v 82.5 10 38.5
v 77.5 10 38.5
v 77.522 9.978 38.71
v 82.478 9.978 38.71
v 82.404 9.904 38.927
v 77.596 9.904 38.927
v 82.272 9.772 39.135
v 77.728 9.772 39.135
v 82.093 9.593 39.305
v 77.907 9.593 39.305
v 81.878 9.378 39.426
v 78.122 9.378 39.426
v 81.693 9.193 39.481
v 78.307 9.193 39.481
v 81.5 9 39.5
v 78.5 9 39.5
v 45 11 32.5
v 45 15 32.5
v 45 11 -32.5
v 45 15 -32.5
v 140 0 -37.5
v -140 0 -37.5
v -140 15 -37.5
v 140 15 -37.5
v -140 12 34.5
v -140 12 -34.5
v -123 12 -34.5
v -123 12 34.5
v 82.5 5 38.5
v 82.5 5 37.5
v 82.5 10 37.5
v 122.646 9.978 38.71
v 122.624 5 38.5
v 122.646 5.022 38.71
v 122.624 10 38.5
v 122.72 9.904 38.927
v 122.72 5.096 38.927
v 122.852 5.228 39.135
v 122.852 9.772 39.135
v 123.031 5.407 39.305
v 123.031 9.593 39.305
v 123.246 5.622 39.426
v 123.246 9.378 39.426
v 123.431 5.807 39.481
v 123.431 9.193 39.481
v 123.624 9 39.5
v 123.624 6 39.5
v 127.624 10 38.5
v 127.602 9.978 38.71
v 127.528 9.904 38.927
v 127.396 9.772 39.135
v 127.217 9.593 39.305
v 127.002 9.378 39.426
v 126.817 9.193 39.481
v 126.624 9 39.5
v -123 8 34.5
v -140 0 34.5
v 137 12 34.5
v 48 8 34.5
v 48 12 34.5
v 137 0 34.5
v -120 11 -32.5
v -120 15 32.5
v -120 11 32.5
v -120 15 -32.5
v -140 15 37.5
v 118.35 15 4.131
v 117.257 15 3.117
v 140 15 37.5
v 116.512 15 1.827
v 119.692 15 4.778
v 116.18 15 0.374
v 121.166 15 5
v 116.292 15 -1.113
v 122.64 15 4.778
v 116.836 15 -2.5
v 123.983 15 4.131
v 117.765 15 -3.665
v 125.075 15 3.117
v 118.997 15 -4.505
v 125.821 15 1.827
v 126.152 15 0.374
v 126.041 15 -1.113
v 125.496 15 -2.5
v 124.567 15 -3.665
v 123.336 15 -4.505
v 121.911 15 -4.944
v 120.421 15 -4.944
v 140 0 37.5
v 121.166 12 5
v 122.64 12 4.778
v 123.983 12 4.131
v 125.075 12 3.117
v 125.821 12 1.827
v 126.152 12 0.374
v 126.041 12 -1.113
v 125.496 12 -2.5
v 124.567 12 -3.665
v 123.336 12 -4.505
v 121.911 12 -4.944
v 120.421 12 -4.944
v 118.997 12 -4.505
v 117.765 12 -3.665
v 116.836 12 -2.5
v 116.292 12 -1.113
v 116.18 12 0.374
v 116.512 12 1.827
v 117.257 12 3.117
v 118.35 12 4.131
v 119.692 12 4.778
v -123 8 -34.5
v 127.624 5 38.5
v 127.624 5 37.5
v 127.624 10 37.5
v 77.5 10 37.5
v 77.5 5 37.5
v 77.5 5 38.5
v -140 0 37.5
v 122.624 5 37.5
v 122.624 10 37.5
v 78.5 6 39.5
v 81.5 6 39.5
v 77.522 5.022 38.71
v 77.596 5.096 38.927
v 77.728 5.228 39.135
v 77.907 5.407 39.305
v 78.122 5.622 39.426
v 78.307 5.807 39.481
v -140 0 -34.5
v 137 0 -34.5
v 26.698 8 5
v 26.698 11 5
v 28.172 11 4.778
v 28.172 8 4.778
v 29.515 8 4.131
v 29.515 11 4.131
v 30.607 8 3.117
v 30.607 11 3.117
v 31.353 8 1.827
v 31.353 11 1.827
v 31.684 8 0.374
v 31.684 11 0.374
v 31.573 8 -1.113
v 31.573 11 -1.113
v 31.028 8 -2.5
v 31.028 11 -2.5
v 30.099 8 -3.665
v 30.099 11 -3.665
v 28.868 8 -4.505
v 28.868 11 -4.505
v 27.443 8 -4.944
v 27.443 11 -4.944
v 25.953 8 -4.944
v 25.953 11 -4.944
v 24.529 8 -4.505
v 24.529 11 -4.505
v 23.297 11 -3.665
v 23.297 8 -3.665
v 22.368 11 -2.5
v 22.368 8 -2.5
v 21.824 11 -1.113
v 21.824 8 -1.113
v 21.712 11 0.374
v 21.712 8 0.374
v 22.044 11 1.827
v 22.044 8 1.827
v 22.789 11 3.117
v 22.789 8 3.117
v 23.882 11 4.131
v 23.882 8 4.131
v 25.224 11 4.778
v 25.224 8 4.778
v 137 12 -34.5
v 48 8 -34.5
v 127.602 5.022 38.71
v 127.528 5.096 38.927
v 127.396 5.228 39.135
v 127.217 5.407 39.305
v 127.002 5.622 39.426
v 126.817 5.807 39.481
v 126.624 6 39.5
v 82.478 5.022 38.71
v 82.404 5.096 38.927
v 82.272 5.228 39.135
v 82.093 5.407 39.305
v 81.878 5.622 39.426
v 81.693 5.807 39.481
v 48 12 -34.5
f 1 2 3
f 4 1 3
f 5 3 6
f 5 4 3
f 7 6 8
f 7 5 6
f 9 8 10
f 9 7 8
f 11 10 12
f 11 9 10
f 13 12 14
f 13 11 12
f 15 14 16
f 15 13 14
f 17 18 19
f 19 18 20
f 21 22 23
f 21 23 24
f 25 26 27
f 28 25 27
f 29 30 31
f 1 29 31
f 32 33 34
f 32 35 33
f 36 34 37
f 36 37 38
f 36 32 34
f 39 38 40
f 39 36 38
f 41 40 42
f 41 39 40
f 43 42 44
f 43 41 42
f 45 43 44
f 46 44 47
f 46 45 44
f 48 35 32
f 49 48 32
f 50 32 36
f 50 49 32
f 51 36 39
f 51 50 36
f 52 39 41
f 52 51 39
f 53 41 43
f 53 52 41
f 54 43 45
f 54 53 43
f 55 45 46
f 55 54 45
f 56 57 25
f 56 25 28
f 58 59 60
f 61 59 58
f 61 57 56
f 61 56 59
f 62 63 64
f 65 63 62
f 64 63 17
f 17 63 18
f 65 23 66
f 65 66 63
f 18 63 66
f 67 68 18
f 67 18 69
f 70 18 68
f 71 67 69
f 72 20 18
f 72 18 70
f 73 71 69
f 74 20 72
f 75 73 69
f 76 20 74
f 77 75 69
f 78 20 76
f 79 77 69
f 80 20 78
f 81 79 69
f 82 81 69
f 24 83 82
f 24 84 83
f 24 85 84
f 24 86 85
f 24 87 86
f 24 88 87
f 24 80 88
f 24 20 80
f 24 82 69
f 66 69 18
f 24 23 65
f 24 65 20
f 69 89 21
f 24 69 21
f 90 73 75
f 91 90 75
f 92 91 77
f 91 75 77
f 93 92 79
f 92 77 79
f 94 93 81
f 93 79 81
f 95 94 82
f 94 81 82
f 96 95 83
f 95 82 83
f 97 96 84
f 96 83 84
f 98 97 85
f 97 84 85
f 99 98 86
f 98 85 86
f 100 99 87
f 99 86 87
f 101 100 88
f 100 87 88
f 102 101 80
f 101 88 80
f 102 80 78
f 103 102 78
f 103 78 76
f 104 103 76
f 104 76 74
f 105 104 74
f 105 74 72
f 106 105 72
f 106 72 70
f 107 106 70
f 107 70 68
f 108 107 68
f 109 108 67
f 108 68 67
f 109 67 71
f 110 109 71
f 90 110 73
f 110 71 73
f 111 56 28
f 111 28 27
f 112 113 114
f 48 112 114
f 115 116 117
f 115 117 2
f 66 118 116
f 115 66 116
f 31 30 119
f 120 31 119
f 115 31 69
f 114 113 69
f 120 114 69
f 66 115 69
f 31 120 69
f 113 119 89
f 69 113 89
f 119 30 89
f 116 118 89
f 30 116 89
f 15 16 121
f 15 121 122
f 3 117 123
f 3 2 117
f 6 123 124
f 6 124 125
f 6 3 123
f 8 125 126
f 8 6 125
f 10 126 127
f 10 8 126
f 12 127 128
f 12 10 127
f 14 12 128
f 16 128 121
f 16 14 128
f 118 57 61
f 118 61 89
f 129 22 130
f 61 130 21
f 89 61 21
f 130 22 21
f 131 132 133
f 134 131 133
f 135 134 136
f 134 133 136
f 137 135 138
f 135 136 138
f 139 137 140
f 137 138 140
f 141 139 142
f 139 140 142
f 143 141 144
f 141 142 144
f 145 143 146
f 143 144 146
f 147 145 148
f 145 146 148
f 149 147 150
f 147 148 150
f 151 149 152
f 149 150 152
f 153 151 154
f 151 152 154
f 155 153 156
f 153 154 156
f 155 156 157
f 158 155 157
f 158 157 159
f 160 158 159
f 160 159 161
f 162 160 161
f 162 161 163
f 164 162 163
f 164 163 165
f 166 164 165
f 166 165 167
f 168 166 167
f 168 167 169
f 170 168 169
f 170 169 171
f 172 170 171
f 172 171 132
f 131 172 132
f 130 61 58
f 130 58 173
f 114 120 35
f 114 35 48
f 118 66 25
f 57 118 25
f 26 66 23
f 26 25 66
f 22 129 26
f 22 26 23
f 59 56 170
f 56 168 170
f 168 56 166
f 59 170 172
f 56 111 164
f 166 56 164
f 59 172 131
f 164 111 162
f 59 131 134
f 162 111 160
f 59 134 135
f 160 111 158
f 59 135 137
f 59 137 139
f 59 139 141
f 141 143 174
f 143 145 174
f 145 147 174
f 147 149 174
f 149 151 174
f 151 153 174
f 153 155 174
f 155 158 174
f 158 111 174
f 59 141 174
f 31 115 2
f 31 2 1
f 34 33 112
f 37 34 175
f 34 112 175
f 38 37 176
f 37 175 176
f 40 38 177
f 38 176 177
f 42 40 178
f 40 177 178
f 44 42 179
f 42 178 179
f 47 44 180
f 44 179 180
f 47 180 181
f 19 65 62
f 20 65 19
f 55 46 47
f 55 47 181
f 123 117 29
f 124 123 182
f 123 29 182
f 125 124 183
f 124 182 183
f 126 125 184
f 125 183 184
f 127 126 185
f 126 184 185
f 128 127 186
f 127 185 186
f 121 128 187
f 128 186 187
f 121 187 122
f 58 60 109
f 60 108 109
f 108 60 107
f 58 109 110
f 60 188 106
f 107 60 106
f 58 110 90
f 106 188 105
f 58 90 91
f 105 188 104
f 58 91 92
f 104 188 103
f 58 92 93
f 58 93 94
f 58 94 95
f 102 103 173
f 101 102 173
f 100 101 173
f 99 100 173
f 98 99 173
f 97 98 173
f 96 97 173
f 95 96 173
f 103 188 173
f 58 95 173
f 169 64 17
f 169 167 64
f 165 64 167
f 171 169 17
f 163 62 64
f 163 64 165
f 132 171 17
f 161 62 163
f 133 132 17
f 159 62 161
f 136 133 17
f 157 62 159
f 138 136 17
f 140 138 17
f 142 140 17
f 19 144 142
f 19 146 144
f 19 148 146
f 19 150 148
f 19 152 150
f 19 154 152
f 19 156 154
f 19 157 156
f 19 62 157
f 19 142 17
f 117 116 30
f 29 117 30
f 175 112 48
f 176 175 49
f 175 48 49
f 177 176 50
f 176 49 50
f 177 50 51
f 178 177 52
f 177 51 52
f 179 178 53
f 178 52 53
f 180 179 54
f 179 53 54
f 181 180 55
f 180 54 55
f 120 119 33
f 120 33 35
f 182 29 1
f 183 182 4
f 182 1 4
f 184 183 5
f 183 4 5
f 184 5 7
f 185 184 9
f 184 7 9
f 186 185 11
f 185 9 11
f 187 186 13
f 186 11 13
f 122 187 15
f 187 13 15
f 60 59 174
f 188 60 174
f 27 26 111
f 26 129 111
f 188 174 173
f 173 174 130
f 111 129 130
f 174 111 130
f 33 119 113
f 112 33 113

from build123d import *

# Parameters (mm, degrees)
SKETCH1_W            = 280
SKETCH1_H            = 75
BOSS_EXTRUDE1_DEPTH  = 15
SKETCH8_R            = 5
CUT_EXTRUDE4_DEPTH   = 146.709471209
SKETCH10_R           = 5
CUT_EXTRUDE6_DEPTH   = 146.709471209
SKETCH9_W            = 165
SKETCH9_H            = 65
CUT_EXTRUDE5_DEPTH   = 4
SHELL2_OUTLINE_W     = 277
SHELL2_OUTLINE_H     = 69
SHELL2_OUTLINE_R     = 5
SHELL2_DEPTH         = 8
SHELL2_START         = 8
SHELL2_2_OUTLINE_W   = 17
SHELL2_2_OUTLINE_H   = 69
SHELL2_2_OUTLINE_W_2 = 89
SHELL2_2_OUTLINE_R   = 5
SHELL2_2_DEPTH       = 4
SKETCH11_W           = 5
SKETCH11_H           = 5
BOSS_EXTRUDE4_DEPTH  = 2
FILLET1_R            = 1


# Read off the part's stored shape, not the designer's step: Shell2
with BuildPart() as part:
    # Sketch1 → Boss-Extrude1 (new body)
    with BuildSketch(Plane(origin=(0, 0, 0), x_dir=(1, 0, 0), z_dir=(0, 1, 0))):
        Rectangle(SKETCH1_W, SKETCH1_H)
    extrude(amount=BOSS_EXTRUDE1_DEPTH)

    # Sketch8 → Cut-Extrude4 (cut, through all)
    with BuildSketch(Plane(origin=(0, 15, 0), x_dir=(1, 0, 0), z_dir=(0, 1, 0))):
        with Locations(Location((121.166163263, 0, 0), (0, 0, 270))):
            Circle(SKETCH8_R)
    extrude(amount=-CUT_EXTRUDE4_DEPTH, mode=Mode.SUBTRACT)

    # Sketch10 → Cut-Extrude6 (cut, through all)
    with BuildSketch(Plane(origin=(0, 15, 0), x_dir=(1, 0, 0), z_dir=(0, 1, 0))):
        with Locations(Location((26.698268473, 0, 0), (0, 0, 270))):
            Circle(SKETCH10_R)
    extrude(amount=-CUT_EXTRUDE6_DEPTH, mode=Mode.SUBTRACT)

    # Sketch9 → Cut-Extrude5 (cut)
    with BuildSketch(Plane(origin=(0, 15, 0), x_dir=(1, 0, 0), z_dir=(0, 1, 0))):
        with Locations((-37.5, 0)):
            Rectangle(SKETCH9_W, SKETCH9_H)
    extrude(amount=-CUT_EXTRUDE5_DEPTH, mode=Mode.SUBTRACT)

    # Shell2 outline → Shell2 (cut)
    with BuildSketch(Plane(origin=(0, 0, 0), x_dir=(1, 0, 0), z_dir=(0, 1, 0))):
        with Locations((-1.5, 0)):
            Rectangle(SHELL2_OUTLINE_W, SHELL2_OUTLINE_H)
        with Locations((26.698268473, 0)):
            Circle(SHELL2_OUTLINE_R, mode=Mode.SUBTRACT)
        with Locations((121.166163263, 0)):
            Circle(SHELL2_OUTLINE_R, mode=Mode.SUBTRACT)
    extrude(amount=SHELL2_DEPTH, mode=Mode.SUBTRACT)

    # Shell2 2 outline → Shell2 2 (cut)
    # profile 1 of 2: a face of its own
    with BuildSketch(Plane(origin=(0, 0, 0), x_dir=(1, 0, 0), z_dir=(0, 1, 0)).offset(SHELL2_START)):
        with Locations((-131.5, 0)):
            Rectangle(SHELL2_2_OUTLINE_W, SHELL2_2_OUTLINE_H)
    # profile 2 of 2: a face of its own
    with BuildSketch(Plane(origin=(0, 0, 0), x_dir=(1, 0, 0), z_dir=(0, 1, 0)).offset(SHELL2_START)):
        with Locations((92.5, 0)):
            Rectangle(SHELL2_2_OUTLINE_W_2, SHELL2_2_OUTLINE_H)
        with Locations((121.166163263, 0)):
            Circle(SHELL2_2_OUTLINE_R, mode=Mode.SUBTRACT)
    extrude(amount=SHELL2_2_DEPTH, mode=Mode.SUBTRACT)

    # Sketch11 → Boss-Extrude4 (add)
    with BuildSketch(Plane.XY.offset(37.5)):
        with Locations((80, 7.5)):
            Rectangle(SKETCH11_W, SKETCH11_H)
        with Locations((125.124035555, 7.5)):
            Rectangle(SKETCH11_W, SKETCH11_H)
    extrude(amount=BOSS_EXTRUDE4_DEPTH)

    # Fillet1
    fillet1_edges = [part.edges().sort_by_distance(p)[0] for p in [
        (82.5, 7.5, 39.5),
        (80, 10, 39.5),
        (77.5, 7.5, 39.5),
        (80, 5, 39.5),
        (127.624035555, 7.5, 39.5),
        (125.124035555, 10, 39.5),
        (122.624035555, 7.5, 39.5),
        (125.124035555, 5, 39.5),
    ]]
    fillet(fillet1_edges, radius=FILLET1_R)


solid = part.part
